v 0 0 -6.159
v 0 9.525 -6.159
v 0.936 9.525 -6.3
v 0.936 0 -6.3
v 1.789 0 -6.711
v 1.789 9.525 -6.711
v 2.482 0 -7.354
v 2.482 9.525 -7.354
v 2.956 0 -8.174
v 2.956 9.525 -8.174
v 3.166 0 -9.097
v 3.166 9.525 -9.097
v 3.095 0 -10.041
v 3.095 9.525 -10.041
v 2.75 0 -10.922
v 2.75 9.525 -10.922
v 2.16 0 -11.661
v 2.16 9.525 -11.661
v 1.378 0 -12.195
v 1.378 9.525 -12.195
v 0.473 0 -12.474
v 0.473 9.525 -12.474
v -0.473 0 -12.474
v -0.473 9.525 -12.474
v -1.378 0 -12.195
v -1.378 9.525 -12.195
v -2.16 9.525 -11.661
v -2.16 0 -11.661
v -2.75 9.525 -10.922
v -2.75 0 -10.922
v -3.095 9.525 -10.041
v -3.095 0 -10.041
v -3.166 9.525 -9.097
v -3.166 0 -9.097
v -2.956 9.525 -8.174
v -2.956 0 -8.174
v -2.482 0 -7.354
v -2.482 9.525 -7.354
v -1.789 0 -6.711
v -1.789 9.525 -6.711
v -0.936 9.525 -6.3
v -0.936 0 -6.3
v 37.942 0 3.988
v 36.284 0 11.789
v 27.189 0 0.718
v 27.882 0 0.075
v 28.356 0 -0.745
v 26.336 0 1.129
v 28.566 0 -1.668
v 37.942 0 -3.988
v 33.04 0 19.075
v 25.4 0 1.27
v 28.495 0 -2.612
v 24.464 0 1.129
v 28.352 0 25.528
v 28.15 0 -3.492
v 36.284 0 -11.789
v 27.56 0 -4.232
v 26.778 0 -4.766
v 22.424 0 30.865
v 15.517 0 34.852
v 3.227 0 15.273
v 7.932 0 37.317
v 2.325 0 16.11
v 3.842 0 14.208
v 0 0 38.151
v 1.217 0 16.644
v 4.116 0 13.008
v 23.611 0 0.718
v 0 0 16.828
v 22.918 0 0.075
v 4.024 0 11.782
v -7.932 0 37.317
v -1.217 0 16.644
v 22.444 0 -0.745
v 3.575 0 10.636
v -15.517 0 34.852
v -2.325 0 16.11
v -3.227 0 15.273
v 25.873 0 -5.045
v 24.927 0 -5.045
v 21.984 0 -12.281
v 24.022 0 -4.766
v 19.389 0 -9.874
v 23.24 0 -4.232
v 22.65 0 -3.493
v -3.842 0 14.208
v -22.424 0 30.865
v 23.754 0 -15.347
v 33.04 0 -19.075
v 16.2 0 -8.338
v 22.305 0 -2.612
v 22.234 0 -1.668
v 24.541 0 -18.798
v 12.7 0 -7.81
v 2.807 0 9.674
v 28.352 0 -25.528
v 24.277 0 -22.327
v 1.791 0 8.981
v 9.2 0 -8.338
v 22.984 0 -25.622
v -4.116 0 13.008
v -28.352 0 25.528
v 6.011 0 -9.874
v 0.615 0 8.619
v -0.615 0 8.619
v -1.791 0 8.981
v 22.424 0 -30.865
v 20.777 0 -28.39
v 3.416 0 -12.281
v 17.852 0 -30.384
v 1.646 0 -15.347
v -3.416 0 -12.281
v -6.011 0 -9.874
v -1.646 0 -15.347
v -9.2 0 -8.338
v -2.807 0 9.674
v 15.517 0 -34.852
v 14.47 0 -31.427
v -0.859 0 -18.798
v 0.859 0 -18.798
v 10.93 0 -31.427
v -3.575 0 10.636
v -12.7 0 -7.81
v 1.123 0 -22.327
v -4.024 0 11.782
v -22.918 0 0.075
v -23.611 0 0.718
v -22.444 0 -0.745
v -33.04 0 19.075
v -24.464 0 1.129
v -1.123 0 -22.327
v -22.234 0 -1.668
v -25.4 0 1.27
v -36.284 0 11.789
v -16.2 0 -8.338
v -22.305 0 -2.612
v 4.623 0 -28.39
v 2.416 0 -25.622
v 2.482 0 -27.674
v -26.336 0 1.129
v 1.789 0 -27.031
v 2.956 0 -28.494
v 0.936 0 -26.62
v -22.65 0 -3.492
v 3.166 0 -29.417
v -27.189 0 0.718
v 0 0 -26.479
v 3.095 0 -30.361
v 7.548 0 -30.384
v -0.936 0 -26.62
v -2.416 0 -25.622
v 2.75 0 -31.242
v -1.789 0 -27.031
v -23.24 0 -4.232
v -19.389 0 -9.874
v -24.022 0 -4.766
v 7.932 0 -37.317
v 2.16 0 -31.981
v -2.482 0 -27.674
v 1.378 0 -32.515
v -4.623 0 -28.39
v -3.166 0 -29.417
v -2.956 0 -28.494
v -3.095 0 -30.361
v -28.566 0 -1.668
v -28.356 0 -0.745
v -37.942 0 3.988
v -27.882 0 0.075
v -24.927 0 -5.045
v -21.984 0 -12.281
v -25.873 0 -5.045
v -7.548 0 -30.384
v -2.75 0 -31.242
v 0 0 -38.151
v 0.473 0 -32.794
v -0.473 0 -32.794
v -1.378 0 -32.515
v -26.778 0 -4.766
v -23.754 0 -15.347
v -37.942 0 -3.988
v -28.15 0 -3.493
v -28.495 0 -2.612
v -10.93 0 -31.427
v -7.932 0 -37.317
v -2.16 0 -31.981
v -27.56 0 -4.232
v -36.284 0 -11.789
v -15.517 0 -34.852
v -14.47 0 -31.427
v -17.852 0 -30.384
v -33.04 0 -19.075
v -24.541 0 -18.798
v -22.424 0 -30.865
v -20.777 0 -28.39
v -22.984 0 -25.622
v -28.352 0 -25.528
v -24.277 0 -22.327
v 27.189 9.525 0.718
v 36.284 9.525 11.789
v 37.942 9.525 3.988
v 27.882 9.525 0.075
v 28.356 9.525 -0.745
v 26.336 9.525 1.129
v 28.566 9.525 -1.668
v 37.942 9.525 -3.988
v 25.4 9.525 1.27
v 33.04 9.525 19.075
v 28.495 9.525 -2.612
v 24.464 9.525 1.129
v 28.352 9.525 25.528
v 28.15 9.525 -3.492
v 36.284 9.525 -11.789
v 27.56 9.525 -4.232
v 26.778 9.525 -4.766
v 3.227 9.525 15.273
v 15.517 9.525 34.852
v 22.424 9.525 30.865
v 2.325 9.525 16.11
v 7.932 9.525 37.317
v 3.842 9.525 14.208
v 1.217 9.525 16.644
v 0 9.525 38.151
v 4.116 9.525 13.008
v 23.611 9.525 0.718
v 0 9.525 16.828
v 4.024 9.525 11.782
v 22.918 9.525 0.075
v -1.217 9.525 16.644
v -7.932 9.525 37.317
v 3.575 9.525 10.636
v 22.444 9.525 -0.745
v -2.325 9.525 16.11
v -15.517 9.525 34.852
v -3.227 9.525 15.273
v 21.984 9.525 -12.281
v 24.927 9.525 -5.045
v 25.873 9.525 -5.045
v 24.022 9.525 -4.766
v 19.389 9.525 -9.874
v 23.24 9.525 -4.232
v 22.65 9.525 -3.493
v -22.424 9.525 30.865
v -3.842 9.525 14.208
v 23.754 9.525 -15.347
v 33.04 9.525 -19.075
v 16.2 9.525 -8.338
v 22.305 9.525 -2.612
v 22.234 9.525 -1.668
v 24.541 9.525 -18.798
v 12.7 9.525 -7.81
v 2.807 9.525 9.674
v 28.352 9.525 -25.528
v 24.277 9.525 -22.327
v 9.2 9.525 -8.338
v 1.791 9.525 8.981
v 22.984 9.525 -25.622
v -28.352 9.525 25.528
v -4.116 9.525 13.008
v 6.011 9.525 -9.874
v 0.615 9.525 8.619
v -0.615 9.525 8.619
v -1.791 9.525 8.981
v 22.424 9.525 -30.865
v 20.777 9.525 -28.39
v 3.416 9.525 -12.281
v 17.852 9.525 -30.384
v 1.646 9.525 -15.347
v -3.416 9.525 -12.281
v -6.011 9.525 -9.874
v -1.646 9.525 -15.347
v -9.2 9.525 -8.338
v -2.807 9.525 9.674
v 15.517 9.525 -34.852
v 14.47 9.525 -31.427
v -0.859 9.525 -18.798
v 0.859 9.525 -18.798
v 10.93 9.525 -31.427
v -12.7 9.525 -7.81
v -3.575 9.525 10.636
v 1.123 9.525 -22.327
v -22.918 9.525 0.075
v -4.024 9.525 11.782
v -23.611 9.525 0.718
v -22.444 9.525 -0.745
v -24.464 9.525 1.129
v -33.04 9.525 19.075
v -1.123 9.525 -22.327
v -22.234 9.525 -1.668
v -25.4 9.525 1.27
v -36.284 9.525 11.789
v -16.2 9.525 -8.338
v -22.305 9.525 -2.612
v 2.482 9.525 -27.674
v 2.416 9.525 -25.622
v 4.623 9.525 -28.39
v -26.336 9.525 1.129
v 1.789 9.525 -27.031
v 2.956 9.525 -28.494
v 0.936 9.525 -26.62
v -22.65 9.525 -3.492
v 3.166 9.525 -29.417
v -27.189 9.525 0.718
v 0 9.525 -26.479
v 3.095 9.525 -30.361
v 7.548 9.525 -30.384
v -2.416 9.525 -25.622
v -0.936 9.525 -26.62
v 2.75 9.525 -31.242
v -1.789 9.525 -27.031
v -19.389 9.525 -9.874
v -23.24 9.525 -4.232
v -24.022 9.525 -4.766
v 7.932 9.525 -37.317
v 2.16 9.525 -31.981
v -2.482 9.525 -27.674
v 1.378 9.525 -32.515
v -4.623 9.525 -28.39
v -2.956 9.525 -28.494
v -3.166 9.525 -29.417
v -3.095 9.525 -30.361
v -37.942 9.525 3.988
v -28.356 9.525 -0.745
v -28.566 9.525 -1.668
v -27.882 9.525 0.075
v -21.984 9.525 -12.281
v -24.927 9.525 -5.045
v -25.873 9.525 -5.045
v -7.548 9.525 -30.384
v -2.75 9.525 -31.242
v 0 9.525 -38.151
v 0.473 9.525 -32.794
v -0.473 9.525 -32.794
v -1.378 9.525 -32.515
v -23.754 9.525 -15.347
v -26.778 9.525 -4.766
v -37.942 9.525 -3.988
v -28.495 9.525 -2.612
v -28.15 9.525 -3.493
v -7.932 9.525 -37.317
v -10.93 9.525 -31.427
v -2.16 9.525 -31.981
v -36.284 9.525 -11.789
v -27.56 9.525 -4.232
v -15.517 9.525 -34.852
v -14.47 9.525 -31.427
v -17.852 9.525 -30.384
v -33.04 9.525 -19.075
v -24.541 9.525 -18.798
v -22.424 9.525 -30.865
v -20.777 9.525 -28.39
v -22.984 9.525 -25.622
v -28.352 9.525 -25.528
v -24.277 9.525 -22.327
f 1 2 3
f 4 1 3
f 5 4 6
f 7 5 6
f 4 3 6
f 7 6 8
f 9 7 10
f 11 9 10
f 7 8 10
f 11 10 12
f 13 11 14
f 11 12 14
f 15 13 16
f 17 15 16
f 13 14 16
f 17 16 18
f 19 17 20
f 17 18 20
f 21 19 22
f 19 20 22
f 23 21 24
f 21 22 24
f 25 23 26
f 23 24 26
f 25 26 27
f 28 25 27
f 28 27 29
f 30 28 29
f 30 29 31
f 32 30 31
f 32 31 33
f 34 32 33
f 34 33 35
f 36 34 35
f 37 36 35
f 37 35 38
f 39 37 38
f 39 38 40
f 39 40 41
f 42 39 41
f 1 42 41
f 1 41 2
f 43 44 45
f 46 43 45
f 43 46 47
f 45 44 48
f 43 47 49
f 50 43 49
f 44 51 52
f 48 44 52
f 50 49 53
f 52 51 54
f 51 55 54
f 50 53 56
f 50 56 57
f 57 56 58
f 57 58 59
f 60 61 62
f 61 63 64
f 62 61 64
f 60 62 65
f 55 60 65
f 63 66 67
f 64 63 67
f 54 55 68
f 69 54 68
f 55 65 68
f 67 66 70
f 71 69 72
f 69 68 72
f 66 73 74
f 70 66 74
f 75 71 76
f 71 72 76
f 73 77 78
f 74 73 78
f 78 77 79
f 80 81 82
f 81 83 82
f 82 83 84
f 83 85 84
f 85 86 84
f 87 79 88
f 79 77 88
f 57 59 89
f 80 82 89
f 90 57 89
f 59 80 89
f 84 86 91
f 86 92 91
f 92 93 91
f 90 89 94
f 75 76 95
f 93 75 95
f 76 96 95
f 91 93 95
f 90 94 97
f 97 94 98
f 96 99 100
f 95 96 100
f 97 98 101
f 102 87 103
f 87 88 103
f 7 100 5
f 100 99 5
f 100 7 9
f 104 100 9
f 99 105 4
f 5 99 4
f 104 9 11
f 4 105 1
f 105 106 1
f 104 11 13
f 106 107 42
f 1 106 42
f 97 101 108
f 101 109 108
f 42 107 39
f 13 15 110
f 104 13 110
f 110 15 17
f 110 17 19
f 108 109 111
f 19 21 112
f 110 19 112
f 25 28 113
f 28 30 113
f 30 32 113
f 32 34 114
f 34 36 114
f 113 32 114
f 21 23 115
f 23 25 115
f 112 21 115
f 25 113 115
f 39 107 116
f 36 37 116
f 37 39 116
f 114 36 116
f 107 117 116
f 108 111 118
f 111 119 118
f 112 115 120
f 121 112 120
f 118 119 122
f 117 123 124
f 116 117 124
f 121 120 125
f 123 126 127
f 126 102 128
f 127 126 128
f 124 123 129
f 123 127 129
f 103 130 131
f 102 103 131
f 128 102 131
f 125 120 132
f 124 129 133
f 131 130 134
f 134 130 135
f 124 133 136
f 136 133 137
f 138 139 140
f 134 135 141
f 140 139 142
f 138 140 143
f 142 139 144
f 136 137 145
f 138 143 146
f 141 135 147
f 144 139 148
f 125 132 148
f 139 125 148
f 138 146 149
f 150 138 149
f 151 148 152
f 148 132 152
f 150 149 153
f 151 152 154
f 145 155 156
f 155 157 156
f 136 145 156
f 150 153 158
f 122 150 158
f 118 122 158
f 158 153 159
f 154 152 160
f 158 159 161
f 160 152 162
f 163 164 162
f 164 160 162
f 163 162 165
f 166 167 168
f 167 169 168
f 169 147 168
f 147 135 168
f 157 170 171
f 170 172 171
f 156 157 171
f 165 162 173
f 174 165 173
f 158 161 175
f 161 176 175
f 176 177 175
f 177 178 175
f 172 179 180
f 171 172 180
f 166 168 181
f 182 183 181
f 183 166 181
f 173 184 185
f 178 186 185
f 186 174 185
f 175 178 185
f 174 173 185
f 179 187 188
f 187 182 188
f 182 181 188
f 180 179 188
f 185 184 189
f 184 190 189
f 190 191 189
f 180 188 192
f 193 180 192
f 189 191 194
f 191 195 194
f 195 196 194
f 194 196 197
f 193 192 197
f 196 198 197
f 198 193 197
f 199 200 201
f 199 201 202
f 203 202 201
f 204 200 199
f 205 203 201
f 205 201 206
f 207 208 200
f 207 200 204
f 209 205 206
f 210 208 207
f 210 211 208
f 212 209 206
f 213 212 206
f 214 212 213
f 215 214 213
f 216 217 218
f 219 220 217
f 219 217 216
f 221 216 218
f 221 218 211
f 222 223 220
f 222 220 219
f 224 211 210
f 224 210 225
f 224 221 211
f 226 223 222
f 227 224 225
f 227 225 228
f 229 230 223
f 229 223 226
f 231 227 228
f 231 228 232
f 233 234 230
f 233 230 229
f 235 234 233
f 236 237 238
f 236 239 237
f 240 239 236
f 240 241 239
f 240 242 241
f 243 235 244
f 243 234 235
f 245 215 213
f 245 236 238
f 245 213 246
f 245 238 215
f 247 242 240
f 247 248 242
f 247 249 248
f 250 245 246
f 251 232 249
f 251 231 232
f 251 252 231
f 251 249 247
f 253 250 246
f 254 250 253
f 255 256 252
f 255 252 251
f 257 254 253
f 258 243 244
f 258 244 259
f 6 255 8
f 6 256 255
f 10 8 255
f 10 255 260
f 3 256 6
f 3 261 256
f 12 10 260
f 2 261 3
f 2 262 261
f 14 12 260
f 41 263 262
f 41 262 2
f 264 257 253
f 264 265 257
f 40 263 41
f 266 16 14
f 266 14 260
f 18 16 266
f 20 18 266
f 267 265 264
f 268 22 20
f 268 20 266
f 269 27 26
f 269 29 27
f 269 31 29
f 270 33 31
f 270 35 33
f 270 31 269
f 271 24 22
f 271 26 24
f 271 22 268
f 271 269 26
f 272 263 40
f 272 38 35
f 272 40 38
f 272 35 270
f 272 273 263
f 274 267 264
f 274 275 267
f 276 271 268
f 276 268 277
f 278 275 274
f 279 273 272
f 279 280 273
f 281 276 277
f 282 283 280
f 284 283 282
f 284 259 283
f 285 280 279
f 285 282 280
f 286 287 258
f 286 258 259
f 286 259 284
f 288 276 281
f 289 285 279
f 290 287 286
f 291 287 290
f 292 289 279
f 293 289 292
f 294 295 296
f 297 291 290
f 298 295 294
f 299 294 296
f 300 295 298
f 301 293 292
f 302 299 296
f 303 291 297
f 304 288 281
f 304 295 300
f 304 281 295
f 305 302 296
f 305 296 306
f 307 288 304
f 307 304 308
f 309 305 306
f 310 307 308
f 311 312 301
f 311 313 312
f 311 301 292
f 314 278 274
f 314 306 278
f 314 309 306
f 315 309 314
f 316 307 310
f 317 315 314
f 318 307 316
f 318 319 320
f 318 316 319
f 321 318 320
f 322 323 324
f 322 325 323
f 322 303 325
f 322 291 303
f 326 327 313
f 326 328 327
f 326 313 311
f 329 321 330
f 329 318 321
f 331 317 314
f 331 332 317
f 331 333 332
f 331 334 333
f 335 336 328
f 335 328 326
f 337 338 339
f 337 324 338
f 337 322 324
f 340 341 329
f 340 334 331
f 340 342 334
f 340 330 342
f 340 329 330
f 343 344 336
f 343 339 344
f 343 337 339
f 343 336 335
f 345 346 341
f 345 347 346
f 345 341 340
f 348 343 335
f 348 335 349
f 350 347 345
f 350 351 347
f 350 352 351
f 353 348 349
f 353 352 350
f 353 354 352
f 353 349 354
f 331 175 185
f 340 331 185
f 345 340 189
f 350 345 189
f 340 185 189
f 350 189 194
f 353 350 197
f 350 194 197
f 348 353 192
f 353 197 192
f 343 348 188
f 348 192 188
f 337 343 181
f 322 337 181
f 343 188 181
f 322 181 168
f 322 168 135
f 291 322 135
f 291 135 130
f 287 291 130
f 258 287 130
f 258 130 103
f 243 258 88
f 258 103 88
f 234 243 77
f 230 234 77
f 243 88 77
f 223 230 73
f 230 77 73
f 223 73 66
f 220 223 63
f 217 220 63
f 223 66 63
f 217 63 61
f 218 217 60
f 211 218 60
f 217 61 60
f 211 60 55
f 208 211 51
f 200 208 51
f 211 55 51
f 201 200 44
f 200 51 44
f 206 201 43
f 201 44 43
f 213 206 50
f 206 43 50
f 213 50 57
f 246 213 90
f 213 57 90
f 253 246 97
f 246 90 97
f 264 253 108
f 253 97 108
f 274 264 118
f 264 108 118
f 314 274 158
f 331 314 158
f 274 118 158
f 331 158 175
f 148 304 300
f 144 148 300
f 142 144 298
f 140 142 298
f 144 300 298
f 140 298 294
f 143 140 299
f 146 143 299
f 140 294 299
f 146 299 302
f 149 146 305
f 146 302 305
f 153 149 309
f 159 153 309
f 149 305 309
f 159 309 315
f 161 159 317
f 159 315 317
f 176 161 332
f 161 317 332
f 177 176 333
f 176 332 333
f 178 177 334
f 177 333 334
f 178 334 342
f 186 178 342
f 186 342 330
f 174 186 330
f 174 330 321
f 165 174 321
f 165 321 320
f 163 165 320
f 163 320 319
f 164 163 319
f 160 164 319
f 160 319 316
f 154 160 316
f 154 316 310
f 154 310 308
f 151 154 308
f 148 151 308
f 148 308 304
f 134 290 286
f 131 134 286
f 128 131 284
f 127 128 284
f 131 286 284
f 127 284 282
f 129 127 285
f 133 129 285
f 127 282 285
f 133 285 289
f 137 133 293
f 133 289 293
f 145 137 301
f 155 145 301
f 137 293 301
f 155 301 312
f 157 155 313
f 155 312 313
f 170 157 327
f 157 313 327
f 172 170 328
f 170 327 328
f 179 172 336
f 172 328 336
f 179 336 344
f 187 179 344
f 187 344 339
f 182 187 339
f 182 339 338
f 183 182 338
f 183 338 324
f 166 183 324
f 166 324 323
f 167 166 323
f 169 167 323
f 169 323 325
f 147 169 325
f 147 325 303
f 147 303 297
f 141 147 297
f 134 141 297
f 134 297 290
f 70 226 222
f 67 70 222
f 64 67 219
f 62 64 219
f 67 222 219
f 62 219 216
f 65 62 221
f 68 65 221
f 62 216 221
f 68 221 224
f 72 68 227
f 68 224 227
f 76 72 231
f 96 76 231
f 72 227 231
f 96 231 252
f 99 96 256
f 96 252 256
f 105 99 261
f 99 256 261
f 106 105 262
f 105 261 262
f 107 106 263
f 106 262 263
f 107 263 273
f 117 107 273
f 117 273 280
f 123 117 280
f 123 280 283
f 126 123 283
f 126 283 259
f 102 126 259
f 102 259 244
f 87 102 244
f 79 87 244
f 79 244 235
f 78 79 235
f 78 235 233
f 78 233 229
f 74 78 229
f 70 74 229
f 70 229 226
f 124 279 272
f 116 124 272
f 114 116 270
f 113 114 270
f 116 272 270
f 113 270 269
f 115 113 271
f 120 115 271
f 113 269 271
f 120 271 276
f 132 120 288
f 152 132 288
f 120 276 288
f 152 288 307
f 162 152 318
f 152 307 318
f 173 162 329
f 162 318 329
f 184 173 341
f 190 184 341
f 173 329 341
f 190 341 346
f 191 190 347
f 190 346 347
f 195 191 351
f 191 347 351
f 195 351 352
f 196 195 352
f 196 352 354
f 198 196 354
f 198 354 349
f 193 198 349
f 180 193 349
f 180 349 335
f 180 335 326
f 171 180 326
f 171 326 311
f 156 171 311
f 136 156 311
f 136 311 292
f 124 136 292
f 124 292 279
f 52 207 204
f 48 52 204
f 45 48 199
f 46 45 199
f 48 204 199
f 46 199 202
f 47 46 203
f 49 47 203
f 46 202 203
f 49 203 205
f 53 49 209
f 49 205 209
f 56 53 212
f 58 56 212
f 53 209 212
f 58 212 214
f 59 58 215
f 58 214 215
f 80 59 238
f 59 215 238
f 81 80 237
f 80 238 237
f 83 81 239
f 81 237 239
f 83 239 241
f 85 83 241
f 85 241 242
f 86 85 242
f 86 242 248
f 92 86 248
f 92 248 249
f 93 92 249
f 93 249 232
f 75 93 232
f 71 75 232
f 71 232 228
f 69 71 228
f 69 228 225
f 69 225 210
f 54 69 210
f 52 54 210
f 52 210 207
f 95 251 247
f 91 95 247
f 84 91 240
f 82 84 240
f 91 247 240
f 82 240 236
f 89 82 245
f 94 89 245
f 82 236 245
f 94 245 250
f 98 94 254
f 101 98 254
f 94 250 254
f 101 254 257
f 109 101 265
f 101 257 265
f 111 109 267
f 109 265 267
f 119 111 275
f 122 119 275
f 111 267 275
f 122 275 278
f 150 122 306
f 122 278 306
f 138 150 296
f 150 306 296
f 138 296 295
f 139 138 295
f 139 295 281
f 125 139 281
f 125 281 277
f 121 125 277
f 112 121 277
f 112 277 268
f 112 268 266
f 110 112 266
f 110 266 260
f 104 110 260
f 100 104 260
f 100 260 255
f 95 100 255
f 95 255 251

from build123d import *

# Parameters (mm, degrees)
SKETCH1_R           = 38.1508
BOSS_EXTRUDE1_DEPTH = 9.525
SKETCH19_R          = 11.8745
SKETCH19_R_2        = 3.175
CUT_EXTRUDE1_DEPTH  = 16.764
SKETCH18_R          = 3.175
CUT_EXTRUDE2_DEPTH  = 16.764
SKETCH21_R          = 4.1275
CUT_EXTRUDE3_DEPTH  = 55.787705795


with BuildPart() as part:
    # Sketch1 → Boss-Extrude1 (new body)
    with BuildSketch(Plane(origin=(0, 0, 0), x_dir=(1, 0, 0), z_dir=(0, 1, 0))):
        Circle(SKETCH1_R)
    extrude(amount=BOSS_EXTRUDE1_DEPTH)

    # Sketch19 → Cut-Extrude1 (cut)
    with BuildSketch(Plane(origin=(0, 9.525, 0), x_dir=(1, 0, 0), z_dir=(0, 1, 0))):
        with Locations((-12.7, 19.685)):
            Circle(SKETCH19_R)
        with Locations((12.7, 19.685)):
            Circle(SKETCH19_R)
        with Locations((0, 29.654011512)):
            Circle(SKETCH19_R_2)
        with Locations((0, 9.334011512)):
            Circle(SKETCH19_R_2)
    extrude(amount=-CUT_EXTRUDE1_DEPTH, mode=Mode.SUBTRACT)

    # Sketch18 → Cut-Extrude2 (cut)
    with BuildSketch(Plane(origin=(0, 9.525, 0), x_dir=(1, 0, 0), z_dir=(0, 1, 0))):
        with Locations((25.4, 1.905)):
            Circle(SKETCH18_R)
        with Locations((-25.4, 1.905)):
            Circle(SKETCH18_R)
    extrude(amount=-CUT_EXTRUDE2_DEPTH, mode=Mode.SUBTRACT)

    # Sketch21 → Cut-Extrude3 (cut, through all)
    with BuildSketch(Plane(origin=(0, 9.525, 0), x_dir=(1, 0, 0), z_dir=(0, 1, 0))):
        with Locations((0, -12.7)):
            Circle(SKETCH21_R)
    extrude(amount=-CUT_EXTRUDE3_DEPTH, mode=Mode.SUBTRACT)


solid = part.part
